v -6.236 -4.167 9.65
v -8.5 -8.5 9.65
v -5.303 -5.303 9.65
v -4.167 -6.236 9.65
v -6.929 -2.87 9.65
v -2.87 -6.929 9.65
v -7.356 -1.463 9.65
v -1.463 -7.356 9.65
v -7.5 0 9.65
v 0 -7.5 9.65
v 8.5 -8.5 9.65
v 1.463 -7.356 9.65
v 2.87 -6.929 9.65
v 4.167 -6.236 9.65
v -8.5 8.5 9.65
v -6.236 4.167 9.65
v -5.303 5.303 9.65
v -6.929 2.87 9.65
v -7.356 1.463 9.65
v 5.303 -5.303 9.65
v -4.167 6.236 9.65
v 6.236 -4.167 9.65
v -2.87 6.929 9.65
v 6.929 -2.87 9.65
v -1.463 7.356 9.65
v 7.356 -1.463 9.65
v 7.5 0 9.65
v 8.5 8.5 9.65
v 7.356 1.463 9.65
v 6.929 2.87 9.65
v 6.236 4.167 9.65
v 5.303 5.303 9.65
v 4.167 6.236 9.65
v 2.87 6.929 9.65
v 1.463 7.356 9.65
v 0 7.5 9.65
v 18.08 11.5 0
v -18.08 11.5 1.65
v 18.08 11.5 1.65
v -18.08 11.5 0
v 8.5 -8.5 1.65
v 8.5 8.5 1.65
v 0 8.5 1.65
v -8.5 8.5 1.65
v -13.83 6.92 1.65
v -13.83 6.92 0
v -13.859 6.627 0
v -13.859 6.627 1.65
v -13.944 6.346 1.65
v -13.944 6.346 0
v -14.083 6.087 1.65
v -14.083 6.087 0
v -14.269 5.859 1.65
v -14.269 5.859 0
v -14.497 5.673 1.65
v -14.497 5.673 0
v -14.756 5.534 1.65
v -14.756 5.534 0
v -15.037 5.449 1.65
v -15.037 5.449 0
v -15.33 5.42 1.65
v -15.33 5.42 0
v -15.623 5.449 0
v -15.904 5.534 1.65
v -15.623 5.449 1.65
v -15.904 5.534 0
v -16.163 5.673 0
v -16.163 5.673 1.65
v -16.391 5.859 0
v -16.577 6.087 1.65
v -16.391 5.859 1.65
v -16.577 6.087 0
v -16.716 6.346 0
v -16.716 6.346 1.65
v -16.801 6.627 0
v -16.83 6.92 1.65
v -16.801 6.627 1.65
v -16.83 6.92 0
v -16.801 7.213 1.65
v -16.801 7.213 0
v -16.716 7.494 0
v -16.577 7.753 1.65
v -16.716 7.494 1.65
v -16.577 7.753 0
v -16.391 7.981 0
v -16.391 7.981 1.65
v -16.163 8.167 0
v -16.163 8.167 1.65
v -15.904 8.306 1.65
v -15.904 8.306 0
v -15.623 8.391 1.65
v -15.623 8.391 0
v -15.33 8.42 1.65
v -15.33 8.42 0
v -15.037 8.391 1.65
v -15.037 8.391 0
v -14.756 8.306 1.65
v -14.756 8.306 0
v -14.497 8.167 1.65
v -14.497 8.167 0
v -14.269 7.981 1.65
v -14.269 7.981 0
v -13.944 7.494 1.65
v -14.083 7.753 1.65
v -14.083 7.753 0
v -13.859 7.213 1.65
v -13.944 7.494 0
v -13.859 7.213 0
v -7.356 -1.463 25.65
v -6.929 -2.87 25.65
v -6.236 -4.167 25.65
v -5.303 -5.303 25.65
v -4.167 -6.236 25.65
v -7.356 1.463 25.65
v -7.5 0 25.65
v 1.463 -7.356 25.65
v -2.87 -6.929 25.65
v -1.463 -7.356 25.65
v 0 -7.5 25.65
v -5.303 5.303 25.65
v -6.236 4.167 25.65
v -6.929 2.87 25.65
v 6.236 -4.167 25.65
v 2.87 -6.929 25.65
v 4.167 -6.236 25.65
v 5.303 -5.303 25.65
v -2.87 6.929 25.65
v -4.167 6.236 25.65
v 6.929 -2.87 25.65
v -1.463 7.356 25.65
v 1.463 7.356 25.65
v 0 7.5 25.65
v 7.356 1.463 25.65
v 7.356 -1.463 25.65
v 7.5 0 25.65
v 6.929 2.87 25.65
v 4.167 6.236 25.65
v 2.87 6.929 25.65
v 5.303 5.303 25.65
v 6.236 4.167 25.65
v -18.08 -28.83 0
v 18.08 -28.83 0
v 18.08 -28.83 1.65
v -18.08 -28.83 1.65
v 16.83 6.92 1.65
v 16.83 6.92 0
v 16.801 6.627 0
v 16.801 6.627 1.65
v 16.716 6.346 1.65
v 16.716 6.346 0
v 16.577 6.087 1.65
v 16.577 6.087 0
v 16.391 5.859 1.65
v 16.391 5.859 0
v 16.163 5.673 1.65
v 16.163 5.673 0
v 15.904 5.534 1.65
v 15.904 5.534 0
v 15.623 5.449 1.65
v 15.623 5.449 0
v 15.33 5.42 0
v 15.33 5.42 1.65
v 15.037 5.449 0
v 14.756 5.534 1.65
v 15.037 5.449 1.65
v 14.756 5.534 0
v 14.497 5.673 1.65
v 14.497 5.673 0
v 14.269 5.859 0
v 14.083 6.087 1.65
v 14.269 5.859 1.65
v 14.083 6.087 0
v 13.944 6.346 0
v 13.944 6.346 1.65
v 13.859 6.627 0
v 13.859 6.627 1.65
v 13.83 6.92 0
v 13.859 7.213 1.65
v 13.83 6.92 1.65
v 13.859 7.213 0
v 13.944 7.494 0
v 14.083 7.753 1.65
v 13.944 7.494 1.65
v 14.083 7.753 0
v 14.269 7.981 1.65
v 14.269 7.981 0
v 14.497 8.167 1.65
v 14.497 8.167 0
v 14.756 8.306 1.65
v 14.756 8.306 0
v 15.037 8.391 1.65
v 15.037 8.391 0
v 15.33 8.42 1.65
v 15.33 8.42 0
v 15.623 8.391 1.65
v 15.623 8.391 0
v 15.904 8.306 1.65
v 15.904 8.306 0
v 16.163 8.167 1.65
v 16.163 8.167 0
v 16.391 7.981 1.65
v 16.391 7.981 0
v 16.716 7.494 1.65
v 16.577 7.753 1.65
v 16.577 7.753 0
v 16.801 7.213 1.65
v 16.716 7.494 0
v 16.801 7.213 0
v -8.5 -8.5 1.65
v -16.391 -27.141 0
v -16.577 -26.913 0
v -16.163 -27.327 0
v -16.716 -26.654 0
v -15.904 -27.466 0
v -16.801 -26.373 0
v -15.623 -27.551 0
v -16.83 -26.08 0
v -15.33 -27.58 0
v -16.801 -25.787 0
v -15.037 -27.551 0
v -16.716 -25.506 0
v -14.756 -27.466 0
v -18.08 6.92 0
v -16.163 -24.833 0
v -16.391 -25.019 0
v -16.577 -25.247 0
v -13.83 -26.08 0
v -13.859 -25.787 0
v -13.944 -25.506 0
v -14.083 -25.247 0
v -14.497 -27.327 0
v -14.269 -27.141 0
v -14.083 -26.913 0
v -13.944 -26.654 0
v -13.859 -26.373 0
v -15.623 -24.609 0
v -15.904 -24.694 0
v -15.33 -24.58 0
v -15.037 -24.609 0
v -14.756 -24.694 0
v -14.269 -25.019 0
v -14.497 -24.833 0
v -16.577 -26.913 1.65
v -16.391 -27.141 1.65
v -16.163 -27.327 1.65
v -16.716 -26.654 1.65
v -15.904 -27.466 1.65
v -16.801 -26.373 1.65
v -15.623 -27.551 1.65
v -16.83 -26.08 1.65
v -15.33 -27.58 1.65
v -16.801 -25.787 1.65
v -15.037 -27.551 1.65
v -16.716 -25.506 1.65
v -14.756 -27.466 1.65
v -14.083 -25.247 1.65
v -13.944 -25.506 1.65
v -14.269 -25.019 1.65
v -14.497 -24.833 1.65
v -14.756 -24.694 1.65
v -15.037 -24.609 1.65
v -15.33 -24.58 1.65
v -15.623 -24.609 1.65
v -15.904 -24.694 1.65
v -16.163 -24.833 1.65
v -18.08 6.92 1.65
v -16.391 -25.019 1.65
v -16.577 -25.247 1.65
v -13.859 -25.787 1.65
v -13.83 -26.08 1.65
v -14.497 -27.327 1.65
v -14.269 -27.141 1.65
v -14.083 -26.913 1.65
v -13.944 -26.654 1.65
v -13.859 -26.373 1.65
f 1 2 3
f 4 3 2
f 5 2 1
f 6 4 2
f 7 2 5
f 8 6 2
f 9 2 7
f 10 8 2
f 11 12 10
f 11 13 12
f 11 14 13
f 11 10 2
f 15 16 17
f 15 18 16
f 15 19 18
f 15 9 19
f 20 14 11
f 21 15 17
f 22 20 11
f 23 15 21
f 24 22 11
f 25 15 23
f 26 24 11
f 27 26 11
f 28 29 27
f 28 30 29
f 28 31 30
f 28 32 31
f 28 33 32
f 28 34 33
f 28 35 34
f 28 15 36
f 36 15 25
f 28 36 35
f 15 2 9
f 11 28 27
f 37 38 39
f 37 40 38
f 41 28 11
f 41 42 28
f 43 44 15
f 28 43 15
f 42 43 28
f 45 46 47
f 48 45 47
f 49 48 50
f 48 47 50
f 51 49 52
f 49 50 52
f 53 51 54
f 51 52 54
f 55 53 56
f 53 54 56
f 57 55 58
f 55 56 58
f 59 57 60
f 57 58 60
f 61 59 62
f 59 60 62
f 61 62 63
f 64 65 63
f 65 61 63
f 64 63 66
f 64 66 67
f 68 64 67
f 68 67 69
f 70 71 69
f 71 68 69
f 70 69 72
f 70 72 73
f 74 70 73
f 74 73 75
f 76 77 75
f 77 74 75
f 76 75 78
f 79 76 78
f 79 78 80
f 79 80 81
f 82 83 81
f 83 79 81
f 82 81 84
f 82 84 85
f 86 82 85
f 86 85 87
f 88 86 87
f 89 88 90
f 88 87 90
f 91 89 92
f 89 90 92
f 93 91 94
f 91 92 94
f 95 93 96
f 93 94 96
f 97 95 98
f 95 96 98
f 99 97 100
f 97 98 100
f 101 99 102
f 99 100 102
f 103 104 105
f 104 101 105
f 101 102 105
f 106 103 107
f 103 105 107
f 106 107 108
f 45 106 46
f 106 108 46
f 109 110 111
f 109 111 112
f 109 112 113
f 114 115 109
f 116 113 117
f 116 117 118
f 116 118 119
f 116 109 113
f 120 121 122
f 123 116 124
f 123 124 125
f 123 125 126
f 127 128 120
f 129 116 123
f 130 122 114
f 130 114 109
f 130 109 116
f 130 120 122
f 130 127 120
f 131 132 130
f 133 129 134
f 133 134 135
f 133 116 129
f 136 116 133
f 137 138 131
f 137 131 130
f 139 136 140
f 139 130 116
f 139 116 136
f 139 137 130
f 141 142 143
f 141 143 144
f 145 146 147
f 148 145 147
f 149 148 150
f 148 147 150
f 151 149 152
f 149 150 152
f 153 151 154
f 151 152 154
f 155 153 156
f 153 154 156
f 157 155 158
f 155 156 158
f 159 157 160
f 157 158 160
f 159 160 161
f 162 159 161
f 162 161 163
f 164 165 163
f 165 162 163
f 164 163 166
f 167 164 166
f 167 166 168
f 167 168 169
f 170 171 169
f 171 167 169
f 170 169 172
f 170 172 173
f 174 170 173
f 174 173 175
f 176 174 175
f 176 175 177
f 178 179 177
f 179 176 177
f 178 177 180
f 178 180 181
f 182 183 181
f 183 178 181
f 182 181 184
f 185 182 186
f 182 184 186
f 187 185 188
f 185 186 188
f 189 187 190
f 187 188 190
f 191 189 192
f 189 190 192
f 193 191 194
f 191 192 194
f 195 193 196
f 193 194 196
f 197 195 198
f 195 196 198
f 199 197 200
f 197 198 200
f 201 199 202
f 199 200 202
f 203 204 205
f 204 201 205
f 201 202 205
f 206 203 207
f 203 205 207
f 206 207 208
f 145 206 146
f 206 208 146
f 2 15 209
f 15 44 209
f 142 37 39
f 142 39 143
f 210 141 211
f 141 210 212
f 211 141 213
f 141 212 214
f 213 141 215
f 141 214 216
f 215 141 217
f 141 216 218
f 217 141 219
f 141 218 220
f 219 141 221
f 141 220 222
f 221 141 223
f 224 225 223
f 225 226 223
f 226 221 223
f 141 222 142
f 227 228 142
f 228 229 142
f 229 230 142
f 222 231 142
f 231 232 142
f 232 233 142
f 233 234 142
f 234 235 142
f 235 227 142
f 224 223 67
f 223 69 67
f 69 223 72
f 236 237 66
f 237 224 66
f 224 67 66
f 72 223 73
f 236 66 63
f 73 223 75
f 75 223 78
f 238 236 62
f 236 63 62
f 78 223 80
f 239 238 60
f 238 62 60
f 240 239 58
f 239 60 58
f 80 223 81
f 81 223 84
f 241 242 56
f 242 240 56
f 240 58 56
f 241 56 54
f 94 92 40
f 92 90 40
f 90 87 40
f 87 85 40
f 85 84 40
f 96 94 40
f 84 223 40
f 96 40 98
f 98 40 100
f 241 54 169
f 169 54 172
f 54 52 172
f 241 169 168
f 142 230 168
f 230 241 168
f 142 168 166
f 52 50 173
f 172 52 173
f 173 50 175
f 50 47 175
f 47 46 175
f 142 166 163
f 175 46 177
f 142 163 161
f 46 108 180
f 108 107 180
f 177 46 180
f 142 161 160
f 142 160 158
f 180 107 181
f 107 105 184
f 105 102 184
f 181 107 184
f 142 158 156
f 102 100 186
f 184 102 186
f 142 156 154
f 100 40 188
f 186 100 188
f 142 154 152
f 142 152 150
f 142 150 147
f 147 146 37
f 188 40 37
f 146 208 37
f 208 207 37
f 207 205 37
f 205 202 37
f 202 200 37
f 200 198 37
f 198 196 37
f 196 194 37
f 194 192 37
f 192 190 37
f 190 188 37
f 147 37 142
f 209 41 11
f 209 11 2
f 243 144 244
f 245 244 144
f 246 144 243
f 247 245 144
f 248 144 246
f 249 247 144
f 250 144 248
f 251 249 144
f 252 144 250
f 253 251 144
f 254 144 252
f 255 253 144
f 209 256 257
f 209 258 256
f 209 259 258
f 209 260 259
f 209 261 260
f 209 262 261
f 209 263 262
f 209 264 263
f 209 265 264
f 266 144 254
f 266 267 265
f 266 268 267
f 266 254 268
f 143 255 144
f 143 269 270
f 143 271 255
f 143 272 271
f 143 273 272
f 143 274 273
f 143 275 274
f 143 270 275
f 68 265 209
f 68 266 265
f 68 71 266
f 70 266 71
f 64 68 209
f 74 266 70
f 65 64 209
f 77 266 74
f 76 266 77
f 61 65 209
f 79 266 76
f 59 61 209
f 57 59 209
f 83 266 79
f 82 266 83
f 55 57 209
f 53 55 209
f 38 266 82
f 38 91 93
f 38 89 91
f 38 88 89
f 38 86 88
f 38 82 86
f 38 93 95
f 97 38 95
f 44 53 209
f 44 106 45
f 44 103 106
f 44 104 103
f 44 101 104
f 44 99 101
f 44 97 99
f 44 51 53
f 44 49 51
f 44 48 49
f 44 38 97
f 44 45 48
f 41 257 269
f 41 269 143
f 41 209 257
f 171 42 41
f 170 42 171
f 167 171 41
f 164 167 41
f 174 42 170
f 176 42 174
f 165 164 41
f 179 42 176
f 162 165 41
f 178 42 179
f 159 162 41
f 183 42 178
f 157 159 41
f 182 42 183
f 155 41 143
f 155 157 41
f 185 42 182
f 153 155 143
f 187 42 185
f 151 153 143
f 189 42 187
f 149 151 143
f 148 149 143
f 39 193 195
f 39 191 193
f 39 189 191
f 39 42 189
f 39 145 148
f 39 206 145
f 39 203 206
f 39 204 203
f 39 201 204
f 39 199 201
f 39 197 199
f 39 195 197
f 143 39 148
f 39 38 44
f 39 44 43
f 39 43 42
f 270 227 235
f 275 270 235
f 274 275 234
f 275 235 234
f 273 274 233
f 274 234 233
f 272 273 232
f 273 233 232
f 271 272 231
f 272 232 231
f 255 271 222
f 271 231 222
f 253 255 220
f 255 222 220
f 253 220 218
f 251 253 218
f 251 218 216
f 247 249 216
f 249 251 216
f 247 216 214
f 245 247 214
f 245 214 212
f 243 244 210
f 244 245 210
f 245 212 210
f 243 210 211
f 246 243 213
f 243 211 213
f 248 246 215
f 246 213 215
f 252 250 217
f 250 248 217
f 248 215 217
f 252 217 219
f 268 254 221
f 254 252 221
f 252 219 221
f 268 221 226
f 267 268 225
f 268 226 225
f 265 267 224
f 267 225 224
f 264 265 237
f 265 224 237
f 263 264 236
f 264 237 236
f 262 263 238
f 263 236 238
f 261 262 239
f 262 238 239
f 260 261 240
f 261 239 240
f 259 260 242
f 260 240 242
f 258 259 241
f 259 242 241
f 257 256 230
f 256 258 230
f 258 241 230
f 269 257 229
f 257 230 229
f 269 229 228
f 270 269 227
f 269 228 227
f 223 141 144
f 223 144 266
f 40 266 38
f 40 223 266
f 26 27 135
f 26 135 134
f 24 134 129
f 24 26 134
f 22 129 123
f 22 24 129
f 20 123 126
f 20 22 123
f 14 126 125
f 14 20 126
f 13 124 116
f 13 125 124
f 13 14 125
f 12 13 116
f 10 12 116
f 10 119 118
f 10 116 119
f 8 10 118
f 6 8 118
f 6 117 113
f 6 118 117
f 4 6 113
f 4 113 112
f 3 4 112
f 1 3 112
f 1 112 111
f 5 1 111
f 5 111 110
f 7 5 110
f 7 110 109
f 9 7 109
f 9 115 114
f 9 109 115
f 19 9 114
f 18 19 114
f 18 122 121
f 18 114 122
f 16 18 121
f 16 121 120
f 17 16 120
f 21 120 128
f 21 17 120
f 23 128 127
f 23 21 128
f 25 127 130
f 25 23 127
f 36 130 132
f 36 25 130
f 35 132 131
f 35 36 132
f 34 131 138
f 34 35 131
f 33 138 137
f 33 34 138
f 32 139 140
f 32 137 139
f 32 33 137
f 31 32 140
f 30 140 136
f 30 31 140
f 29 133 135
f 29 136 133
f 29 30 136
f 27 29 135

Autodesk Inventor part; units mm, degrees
ref_plane "YZ Plane" through (0, 0, 0) normal (1, 0, 0) x (0, 1, 0)
ref_plane "XZ Plane" through (0, 0, 0) normal (0, 1, 0) x (-1, 0, 0)
ref_plane "XY Plane" through (0, 0, 0) normal (0, 0, 1) x (1, 0, 0)
sketch "Sketch1" plane through (0, 0, 0) normal (0, 0, 1) x (1, 0, 0)
  line L0 (0, 0) -> (0, 8.5)
  line L1 (0, 8.5) -> (8.5, 8.5)
  line L2 (8.5, 8.5) -> (8.5, -8.5)
  line L3 (8.5, -8.5) -> (-8.5, -8.5)
  line L4 (-8.5, -8.5) -> (-8.5, 8.5)
  line L5 (-8.5, 8.5) -> (0, 8.5)
  line L6 (0, 8.5) -> (0, 10.25)
  line L7 (0, 10.25) -> (-15.33, 10.25)
  line L8 (-15.33, 10.25) -> (-15.33, 6.92)
  circle A0 centre (-15.33, 6.92) radius 1.5
  line L9 (0, 10.25) -> (15.33, 10.25)
  line L10 (15.33, 10.25) -> (15.33, 6.92)
  circle A1 centre (15.33, 6.92) radius 1.5
  line L11 (-15.33, 6.92) -> (-15.33, -26.08)
  circle A2 centre (-15.33, -26.08) radius 1.5
  line L12 (0, 0) -> (0, 6.92)
  line L13 (-16.83, 6.92) -> (-18.08, 6.92)
  line L14 (-18.08, 6.92) -> (-18.08, -28.83)
  line L15 (-18.08, 6.92) -> (-18.08, 11.5)
  line L16 (-18.08, 11.5) -> (-3.5327, 11.5)
  line L17 (-3.5327, 11.5) -> (18.0803, 11.5)
  line L18 (18.0803, 11.5) -> (18.0803, -28.83)
  line L19 (18.0803, -28.83) -> (-18.08, -28.83)
  dimension "d8" = 3
  dimension "d0" = 8.5
  dimension "d1" = 8.5
  dimension "d2" = 17
  dimension "d3" = 17
  dimension "d4" = 17
  dimension "d5" = 1.75
  dimension "d6" = 15.33
  dimension "d7" = 3.33
  dimension "d9" = 15.33
  dimension "d10" = 3.33
  dimension "d11" = 3
  dimension "d12" = 33
  dimension "d13" = 3
  dimension "d14" = 1.25
  dimension "d15" = 35.75
  dimension "d16" = 4.58
  dimension "d17" = 21.613
extrude "Extrusion1" add sketch "Sketch1" along normal blind 1.65
sketch "Sketch2" plane through (0, 0, 1.65) normal (0, 0, 1) x (1, 0, 0)
  line L0 (-8.5, 8.5) -> (-8.5, -8.5) projected
  line L1 (8.5, 8.5) -> (8.5, -8.5) projected
  line L2 (-8.5, 8.5) -> (8.5, 8.5)
  line L3 (8.5, 8.5) -> (8.5, -8.5)
  line L4 (8.5, -8.5) -> (-8.5, -8.5)
  line L5 (-8.5, -8.5) -> (-8.5, 8.5)
  point P0 (0, 0)
extrude "Extrusion2" add sketch "Sketch2" along normal blind 8 and the other way blind 1.65
sketch "Sketch3" plane through (0, 0, 9.65) normal (0, 0, 1) x (1, 0, 0)
  circle A0 centre (0, 0) radius 7.5
  dimension "d24" = 15
extrude "Extrusion3" add sketch "Sketch3" along normal blind 16
properties part number "Pixy Sketch"
